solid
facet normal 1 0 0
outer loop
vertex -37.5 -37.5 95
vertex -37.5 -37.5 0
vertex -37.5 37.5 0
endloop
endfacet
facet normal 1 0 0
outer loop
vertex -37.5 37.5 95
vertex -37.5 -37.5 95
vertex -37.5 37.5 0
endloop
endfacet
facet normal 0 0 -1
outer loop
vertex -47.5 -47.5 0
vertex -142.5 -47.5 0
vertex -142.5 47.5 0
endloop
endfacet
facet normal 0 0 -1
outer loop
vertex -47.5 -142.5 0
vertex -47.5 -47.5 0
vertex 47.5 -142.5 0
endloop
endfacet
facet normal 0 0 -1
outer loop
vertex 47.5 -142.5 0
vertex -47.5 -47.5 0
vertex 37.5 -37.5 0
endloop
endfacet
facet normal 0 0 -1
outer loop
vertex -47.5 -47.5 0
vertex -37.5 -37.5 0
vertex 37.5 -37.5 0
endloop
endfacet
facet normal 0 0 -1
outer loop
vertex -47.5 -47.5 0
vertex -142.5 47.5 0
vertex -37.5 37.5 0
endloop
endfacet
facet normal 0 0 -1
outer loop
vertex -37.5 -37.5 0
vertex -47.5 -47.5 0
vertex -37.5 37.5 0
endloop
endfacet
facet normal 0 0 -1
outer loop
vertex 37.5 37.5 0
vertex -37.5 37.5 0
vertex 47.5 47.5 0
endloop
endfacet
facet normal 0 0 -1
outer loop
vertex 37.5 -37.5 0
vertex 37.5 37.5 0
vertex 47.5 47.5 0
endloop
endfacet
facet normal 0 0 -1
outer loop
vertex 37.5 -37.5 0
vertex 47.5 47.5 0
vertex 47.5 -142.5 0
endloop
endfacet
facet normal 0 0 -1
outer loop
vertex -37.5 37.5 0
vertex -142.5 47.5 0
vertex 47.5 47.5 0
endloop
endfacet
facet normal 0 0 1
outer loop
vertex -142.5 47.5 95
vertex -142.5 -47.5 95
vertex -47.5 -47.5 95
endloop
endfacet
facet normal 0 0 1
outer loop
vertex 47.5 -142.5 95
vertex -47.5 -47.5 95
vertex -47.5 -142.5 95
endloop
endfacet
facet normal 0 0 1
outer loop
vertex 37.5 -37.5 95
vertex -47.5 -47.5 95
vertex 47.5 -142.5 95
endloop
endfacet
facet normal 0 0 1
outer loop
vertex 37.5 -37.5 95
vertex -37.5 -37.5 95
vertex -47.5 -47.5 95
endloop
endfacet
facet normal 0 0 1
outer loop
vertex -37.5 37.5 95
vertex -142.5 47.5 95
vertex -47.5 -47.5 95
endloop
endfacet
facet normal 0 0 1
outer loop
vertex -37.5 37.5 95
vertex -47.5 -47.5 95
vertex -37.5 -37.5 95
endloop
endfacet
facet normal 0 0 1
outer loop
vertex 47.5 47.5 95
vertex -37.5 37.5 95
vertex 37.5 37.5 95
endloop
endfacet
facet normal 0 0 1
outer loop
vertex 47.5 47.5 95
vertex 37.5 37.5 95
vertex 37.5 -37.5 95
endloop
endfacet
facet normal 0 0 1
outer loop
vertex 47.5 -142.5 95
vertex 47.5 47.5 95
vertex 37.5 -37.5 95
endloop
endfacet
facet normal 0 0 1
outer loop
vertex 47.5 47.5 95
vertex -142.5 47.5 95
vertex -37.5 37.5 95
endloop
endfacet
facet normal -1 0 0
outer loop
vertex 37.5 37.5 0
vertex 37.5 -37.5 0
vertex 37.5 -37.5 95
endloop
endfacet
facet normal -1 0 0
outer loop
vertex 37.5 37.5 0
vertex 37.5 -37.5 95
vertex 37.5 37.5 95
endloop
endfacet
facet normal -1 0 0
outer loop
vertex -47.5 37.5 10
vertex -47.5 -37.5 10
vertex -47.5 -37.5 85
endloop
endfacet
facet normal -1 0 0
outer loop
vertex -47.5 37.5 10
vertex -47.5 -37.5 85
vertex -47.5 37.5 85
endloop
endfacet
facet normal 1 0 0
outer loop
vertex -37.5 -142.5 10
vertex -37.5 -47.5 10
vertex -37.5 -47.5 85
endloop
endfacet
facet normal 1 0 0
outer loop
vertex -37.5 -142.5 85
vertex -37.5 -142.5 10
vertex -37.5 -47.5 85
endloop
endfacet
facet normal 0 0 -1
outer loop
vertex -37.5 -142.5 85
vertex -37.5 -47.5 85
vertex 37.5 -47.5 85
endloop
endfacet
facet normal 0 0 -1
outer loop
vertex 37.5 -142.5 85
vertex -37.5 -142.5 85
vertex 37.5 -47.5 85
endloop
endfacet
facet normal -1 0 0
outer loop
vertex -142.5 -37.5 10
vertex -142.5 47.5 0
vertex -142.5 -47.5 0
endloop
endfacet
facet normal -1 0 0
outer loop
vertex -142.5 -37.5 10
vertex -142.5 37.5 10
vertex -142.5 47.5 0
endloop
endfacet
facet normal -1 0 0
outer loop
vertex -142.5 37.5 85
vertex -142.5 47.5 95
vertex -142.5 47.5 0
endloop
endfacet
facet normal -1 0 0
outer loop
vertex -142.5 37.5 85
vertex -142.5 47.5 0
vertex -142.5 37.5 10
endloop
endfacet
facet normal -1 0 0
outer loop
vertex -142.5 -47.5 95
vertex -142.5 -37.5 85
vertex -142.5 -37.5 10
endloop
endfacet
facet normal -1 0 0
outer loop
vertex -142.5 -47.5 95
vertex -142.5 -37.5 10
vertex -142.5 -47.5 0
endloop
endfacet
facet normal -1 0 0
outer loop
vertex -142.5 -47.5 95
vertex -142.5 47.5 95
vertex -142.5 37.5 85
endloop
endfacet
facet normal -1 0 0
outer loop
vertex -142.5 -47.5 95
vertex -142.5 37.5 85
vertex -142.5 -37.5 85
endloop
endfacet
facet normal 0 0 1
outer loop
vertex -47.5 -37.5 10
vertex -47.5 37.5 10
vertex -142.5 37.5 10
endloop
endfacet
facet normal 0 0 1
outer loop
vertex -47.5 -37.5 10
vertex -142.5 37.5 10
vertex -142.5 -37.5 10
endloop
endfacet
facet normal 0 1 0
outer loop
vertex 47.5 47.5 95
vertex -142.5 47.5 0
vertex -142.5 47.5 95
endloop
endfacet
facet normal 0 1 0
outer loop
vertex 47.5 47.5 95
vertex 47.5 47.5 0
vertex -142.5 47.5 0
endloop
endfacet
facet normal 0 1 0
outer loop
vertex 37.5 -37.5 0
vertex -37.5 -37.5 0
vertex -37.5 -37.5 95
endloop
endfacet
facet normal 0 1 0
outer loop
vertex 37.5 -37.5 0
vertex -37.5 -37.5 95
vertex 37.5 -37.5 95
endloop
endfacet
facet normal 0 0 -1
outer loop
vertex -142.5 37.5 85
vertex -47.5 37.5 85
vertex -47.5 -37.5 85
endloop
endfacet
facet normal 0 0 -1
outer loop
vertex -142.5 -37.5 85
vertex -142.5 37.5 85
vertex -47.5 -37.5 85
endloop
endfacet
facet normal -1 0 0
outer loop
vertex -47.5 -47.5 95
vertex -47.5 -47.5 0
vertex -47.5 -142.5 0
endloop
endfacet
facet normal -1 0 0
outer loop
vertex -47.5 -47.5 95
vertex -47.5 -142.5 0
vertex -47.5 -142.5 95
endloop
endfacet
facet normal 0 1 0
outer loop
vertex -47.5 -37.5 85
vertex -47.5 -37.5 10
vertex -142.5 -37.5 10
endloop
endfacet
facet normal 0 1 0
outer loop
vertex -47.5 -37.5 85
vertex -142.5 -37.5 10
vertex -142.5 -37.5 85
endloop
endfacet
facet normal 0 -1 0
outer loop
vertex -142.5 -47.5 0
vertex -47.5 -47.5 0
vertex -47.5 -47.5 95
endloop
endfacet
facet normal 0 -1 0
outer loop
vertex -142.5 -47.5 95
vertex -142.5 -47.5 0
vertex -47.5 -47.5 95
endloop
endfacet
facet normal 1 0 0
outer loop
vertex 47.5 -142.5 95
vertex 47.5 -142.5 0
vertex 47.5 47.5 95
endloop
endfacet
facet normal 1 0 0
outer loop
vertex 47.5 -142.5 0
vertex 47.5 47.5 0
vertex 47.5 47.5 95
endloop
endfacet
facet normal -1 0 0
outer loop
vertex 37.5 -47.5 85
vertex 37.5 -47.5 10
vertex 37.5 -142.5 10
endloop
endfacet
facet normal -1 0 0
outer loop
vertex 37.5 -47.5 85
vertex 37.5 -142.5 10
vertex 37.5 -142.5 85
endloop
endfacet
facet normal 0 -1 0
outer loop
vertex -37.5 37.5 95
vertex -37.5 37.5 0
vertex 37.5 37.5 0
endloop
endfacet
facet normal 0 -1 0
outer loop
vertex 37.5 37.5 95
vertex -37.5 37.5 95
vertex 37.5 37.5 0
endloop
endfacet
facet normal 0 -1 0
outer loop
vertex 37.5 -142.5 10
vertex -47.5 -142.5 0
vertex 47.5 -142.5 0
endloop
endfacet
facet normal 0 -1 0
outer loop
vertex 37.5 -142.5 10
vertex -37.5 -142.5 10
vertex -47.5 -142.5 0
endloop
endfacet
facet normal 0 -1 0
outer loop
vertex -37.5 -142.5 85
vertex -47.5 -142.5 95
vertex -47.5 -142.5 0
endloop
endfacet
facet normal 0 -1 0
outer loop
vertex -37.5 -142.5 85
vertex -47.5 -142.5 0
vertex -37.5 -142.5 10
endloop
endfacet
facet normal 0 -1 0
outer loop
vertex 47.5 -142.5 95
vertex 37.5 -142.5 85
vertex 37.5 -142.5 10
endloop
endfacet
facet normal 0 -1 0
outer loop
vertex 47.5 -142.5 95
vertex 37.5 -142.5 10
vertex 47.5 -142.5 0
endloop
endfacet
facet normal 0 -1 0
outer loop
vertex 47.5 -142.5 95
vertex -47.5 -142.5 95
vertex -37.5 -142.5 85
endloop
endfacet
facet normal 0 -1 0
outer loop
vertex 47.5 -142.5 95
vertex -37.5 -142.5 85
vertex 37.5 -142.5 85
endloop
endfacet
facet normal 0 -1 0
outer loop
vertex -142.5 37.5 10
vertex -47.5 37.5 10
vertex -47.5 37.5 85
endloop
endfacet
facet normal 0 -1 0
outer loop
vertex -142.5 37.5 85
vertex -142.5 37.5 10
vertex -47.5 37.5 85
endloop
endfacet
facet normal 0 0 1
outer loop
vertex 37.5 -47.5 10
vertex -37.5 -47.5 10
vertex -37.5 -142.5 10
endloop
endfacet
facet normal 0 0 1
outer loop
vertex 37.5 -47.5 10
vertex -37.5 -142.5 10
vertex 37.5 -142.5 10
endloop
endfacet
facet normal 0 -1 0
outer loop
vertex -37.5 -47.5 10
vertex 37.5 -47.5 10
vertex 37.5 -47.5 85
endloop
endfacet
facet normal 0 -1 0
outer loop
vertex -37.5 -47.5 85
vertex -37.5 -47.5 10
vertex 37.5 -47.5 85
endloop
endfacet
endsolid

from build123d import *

# Parameters (mm, degrees)
F0_W     = 95
F0_H     = 95
F0_W_2   = 75
F0_H_2   = 75
F1_DEPTH = 95
F2_W     = 95
F2_H     = 95
F2_W_2   = 75
F2_H_2   = 75
F3_DEPTH = 95
F4_W     = 95
F4_H     = 95
F4_W_2   = 75
F4_H_2   = 75
F5_DEPTH = 95


with BuildPart() as f1:
    # F0 (on Top) → F1 (new body)
    with BuildSketch(Plane.XY):
        Rectangle(F0_W, F0_H)
        Rectangle(F0_W_2, F0_H_2, mode=Mode.SUBTRACT)
    extrude(amount=F1_DEPTH)

    # F2 (on face) → F3 (join)
    with BuildSketch(Plane(origin=(-47.5, 0, 0), x_dir=(0, -1, 0), z_dir=(-1, 0, 0))):
        with Locations((0, 47.5)):
            Rectangle(F2_W, F2_H)
        with Locations((0, 47.5)):
            Rectangle(F2_W_2, F2_H_2, mode=Mode.SUBTRACT)
    extrude(amount=F3_DEPTH)

    # F4 (on face) → F5 (join)
    with BuildSketch(Plane.XZ.offset(47.5)):
        with Locations((0, 47.5)):
            Rectangle(F4_W, F4_H)
        with Locations((0, 47.5)):
            Rectangle(F4_W_2, F4_H_2, mode=Mode.SUBTRACT)
    extrude(amount=F5_DEPTH)


solid = f1.part
